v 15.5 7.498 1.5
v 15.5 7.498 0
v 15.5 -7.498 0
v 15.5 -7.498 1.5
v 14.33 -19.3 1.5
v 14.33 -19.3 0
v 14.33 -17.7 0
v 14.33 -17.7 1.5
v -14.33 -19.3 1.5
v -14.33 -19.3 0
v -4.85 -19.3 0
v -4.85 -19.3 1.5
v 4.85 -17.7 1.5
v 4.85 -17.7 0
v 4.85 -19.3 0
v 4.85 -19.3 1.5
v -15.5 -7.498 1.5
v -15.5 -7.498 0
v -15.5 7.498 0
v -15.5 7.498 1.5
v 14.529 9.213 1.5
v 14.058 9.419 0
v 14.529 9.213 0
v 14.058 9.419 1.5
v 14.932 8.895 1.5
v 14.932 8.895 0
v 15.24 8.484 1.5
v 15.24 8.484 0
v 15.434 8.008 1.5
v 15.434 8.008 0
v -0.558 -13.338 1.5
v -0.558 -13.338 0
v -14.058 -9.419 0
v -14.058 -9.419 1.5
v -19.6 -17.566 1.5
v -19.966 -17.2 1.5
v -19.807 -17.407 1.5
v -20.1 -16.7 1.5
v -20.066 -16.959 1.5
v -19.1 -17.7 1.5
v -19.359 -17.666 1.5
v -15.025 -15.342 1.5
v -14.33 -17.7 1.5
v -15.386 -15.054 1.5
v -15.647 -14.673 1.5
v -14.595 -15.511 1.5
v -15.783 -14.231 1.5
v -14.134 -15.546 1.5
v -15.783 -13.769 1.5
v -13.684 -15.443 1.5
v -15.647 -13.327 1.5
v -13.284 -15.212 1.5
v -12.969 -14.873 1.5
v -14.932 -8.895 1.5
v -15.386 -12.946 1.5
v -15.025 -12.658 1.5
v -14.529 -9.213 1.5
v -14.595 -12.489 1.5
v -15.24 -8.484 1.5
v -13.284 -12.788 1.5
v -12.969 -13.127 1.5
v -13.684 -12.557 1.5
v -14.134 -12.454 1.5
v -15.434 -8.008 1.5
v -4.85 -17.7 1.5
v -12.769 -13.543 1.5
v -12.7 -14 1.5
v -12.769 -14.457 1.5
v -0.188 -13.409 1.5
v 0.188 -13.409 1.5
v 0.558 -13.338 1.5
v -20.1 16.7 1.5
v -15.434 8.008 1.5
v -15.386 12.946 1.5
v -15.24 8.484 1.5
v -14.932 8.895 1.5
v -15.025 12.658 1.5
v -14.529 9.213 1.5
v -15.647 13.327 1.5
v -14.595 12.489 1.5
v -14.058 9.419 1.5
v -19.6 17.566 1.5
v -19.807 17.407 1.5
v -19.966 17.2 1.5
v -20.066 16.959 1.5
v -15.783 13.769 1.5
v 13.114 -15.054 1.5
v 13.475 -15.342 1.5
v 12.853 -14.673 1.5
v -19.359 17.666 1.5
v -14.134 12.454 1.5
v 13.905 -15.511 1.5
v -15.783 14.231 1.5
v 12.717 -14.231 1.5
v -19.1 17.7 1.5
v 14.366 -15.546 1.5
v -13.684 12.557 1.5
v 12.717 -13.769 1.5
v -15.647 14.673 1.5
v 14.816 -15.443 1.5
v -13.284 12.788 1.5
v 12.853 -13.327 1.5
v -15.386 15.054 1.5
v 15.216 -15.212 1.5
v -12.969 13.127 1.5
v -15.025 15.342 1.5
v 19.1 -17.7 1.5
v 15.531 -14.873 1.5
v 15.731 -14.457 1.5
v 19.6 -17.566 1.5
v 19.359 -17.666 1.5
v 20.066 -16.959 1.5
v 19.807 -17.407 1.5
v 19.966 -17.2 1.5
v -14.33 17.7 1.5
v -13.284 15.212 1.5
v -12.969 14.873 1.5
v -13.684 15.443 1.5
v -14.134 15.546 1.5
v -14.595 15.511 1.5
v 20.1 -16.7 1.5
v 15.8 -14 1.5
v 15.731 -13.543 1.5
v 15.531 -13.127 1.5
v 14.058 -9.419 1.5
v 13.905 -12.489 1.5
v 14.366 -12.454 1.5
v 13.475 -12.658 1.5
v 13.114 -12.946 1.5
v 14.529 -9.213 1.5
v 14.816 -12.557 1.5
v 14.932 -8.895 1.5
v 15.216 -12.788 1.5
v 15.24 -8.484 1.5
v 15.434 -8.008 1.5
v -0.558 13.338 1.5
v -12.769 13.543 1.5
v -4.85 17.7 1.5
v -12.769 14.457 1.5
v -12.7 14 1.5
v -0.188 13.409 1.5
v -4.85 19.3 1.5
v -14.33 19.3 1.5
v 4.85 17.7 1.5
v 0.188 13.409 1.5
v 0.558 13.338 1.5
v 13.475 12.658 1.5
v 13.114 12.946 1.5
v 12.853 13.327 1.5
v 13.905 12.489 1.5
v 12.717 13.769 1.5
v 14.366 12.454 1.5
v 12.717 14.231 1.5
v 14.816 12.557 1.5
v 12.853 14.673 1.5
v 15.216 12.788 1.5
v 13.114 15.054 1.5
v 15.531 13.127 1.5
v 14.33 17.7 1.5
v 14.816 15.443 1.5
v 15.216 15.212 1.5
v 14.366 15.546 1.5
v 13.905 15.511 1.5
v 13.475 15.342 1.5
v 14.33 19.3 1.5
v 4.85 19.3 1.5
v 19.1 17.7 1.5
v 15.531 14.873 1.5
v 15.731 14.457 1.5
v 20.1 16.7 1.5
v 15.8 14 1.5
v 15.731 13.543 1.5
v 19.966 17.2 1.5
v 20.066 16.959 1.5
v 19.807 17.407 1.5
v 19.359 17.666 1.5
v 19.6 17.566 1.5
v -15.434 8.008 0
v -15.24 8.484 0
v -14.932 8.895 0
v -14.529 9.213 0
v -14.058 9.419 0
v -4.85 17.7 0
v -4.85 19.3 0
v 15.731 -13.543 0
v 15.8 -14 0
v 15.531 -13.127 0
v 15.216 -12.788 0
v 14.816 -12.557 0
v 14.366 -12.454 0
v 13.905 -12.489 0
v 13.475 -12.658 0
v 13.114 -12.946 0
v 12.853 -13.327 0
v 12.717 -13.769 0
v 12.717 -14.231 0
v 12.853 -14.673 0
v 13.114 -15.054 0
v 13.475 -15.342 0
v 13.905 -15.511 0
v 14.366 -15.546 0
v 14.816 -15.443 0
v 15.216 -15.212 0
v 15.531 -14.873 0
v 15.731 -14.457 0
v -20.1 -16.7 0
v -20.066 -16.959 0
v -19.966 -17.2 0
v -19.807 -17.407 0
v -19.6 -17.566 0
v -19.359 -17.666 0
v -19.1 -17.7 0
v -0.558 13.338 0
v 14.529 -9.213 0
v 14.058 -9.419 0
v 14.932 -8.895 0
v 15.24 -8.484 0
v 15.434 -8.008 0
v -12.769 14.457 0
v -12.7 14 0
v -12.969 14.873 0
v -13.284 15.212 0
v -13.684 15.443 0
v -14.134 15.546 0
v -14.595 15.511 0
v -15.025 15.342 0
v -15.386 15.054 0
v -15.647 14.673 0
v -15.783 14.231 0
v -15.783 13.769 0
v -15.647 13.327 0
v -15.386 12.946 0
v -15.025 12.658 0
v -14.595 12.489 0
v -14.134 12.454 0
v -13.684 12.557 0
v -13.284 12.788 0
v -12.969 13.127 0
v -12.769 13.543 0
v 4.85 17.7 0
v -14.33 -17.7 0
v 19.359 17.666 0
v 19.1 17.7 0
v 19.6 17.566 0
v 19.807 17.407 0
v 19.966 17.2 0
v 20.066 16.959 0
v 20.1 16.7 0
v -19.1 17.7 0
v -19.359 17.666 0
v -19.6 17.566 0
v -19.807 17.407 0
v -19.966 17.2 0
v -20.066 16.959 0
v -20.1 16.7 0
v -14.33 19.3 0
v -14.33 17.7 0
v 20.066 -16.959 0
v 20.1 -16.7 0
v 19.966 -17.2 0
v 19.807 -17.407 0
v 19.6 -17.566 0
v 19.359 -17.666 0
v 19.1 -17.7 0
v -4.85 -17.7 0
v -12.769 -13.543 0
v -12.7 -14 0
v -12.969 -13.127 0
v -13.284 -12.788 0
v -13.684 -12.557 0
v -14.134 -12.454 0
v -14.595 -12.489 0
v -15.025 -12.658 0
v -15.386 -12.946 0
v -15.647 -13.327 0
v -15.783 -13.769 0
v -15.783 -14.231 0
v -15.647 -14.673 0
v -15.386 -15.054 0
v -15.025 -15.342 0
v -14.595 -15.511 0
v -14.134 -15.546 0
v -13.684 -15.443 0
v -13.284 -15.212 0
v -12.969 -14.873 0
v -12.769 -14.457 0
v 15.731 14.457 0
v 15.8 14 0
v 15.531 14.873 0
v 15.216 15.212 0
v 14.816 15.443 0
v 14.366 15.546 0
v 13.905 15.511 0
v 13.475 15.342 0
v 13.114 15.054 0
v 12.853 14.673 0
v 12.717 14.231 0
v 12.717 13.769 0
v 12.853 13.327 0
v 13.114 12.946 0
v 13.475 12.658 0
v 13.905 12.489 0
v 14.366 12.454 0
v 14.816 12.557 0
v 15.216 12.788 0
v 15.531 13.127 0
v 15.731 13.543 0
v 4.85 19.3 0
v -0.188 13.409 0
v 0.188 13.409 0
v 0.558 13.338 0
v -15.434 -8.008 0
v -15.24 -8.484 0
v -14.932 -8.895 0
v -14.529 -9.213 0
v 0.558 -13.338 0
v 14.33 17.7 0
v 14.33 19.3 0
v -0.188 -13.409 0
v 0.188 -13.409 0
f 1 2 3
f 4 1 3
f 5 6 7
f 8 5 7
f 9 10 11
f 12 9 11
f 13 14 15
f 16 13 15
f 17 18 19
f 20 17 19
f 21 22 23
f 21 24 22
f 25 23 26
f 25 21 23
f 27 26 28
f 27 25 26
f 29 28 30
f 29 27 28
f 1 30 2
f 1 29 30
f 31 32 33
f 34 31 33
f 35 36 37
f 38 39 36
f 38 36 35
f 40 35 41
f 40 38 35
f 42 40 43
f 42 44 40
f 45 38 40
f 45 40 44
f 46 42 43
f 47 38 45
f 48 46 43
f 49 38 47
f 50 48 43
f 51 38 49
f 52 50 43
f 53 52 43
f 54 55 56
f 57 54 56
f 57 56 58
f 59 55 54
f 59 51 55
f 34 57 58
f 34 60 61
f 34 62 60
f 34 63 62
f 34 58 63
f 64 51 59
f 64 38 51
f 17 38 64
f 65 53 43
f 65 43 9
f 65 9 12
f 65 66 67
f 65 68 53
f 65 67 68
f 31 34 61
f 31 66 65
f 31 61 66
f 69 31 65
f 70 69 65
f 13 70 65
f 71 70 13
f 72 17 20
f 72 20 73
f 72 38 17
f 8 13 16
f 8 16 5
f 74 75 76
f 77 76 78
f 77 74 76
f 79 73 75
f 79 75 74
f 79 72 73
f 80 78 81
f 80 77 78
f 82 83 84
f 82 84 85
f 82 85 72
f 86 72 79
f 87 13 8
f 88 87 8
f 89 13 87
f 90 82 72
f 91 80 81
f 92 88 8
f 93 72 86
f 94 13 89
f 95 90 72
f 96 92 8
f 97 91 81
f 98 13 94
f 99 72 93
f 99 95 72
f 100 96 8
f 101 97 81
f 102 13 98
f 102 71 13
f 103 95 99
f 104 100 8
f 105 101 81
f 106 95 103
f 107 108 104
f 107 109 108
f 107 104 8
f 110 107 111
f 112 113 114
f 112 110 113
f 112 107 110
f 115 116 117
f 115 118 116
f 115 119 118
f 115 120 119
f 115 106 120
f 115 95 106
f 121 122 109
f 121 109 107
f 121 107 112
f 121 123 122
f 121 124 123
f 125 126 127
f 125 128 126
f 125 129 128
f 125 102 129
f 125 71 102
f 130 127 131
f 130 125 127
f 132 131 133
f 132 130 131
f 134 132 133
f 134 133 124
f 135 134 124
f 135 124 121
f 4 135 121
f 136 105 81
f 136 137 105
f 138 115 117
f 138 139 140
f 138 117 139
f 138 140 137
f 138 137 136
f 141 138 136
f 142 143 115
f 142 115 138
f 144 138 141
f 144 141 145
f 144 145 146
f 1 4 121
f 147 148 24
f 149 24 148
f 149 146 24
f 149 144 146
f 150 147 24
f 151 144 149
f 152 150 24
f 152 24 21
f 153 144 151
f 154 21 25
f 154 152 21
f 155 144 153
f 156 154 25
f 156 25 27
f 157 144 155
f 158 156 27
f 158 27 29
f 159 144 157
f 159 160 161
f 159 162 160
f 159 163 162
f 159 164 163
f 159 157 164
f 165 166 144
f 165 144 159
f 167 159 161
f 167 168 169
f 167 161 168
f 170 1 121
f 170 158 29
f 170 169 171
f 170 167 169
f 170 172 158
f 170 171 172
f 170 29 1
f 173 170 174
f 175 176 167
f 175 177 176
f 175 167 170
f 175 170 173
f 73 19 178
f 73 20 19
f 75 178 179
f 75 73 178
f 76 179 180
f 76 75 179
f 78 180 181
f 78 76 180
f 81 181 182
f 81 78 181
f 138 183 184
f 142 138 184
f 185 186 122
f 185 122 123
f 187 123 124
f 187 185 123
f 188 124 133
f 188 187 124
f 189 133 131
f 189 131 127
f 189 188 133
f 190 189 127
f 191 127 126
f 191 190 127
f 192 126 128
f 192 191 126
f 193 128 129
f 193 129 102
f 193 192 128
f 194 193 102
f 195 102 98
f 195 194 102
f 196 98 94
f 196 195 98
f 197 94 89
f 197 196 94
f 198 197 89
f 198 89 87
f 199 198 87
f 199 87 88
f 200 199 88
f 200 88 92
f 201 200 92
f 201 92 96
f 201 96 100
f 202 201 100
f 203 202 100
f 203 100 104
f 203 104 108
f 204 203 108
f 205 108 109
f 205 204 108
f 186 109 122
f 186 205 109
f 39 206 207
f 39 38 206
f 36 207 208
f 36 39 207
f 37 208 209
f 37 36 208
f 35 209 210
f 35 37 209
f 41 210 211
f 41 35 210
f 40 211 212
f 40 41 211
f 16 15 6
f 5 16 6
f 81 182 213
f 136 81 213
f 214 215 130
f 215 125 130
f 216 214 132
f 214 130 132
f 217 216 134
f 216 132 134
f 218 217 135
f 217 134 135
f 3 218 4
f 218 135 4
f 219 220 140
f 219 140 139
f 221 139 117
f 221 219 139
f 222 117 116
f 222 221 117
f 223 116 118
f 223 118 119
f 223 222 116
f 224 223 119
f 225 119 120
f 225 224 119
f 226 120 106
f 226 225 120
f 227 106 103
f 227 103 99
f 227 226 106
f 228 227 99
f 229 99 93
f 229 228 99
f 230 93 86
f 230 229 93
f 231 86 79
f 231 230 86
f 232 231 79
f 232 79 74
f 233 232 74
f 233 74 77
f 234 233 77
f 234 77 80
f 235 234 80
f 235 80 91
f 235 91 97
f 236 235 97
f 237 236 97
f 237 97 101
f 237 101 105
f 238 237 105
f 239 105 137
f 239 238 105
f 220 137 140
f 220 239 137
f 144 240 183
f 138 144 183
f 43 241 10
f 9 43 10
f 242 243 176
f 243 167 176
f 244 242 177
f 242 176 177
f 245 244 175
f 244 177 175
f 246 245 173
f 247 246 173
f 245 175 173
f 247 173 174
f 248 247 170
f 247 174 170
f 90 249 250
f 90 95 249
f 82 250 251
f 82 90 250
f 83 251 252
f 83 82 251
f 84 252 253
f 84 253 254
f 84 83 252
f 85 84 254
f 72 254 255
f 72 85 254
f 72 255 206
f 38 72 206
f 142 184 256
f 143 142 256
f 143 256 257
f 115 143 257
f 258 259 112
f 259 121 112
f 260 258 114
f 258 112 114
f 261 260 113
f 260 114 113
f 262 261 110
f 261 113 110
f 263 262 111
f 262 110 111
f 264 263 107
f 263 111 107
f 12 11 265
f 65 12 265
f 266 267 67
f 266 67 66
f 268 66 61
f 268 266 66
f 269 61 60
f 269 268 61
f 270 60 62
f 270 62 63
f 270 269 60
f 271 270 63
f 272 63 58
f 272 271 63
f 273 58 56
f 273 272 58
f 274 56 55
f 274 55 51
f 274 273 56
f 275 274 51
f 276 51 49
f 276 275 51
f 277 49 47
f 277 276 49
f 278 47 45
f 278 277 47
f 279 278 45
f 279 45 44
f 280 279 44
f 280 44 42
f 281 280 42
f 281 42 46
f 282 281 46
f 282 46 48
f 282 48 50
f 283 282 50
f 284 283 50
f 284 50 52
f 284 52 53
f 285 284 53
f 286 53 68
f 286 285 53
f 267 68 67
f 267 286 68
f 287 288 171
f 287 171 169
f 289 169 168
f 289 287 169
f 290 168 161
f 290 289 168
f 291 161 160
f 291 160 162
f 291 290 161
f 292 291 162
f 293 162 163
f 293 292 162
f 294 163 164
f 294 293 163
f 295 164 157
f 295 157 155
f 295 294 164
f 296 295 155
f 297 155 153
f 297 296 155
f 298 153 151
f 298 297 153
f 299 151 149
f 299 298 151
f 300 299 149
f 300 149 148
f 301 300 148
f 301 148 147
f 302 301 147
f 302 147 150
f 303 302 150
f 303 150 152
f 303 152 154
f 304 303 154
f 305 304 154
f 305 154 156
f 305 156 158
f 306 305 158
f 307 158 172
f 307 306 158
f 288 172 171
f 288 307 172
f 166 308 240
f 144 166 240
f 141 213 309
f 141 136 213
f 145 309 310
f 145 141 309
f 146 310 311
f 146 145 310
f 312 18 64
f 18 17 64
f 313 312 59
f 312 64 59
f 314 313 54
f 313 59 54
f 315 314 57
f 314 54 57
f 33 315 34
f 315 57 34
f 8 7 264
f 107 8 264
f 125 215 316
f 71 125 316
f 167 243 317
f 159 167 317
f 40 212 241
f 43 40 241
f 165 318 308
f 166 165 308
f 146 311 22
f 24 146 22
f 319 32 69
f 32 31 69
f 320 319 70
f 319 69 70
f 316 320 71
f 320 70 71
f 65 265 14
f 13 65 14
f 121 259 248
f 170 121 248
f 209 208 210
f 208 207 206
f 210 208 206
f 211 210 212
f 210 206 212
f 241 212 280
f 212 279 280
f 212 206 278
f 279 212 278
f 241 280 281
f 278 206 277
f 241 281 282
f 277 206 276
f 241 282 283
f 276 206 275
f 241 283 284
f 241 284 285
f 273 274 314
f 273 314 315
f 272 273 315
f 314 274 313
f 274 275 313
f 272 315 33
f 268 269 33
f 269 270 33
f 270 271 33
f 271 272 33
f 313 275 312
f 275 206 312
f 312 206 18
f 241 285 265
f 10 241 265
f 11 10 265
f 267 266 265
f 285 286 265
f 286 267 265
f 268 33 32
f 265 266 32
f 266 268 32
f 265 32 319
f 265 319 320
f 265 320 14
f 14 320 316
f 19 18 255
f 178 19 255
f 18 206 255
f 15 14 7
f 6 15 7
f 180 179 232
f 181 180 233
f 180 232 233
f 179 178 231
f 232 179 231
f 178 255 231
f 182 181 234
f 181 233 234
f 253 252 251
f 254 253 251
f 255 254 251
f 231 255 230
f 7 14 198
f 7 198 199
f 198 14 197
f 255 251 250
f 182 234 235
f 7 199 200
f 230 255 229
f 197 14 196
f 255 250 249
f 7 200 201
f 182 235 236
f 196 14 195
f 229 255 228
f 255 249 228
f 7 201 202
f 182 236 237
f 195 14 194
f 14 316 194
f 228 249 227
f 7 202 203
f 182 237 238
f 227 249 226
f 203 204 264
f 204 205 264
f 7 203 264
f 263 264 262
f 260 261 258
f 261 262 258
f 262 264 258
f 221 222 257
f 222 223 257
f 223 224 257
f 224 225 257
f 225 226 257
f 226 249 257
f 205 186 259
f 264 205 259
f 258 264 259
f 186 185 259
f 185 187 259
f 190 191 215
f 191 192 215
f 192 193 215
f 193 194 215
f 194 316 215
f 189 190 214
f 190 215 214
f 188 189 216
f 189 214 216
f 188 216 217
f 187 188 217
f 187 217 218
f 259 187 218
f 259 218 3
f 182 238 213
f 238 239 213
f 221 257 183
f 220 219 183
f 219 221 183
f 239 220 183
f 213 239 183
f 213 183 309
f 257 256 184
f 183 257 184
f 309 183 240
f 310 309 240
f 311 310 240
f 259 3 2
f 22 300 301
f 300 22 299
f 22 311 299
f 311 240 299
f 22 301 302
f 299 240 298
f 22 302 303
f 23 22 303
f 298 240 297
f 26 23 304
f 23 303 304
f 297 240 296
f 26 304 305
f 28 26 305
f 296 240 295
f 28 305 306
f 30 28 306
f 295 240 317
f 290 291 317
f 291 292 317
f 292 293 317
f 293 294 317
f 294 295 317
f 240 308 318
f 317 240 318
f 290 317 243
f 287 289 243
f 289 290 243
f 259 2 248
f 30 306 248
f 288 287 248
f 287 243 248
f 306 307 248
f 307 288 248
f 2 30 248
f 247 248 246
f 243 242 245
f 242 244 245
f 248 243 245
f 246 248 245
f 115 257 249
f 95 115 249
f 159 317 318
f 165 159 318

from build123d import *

# Parameters (mm, degrees)
F0_R     = 1.55
F1_DEPTH = 1.5
F2_R     = 2
F3_R     = 1


with BuildPart() as f1:
    # F0 (on Top) → F1 (new body)
    with BuildSketch(Plane.XY):
        Polygon((-14.33, 17.7), (-20.1, 17.7), (-20.1, -17.7), (-14.33, -17.7), (-14.33, -19.3), (-4.85, -19.3), (-4.85, -17.7), (0, -17.7), (4.85, -17.7), (4.85, -19.3), (14.33, -19.3), (14.33, -17.7), (20.1, -17.7), (20.1, 17.7), (14.33, 17.7), (14.33, 19.3), (4.85, 19.3), (4.85, 17.7), (0, 17.7), (-4.85, 17.7), (-4.85, 19.3), (-14.33, 19.3), align=None)
        with Locations((-14.25, -14)):
            Circle(F0_R, mode=Mode.SUBTRACT)
        with Locations((14.25, -14)):
            Circle(F0_R, mode=Mode.SUBTRACT)
        with Locations((-14.25, 14)):
            Circle(F0_R, mode=Mode.SUBTRACT)
        Polygon((-15.5, 9), (0, 13.5), (15.5, 9), (15.5, -9), (0, -13.5), (-15.5, -9), align=None, mode=Mode.SUBTRACT)
        with Locations((14.25, 14)):
            Circle(F0_R, mode=Mode.SUBTRACT)
    extrude(amount=F1_DEPTH)

    # F2
    f2_edges = [f1.edges().sort_by_distance(p)[0] for p in [
        (-15.5, -9, 0.75),
        (-15.5, 9, 0.75),
        (0, 13.5, 0.75),
        (15.5, 9, 0.75),
        (15.5, -9, 0.75),
        (0, -13.5, 0.75),
    ]]
    fillet(f2_edges, radius=F2_R)

    # F3
    f3_edges = [f1.edges().sort_by_distance(p)[0] for p in [
        (-20.1, 17.7, 0.75),
        (20.1, 17.7, 0.75),
        (20.1, -17.7, 0.75),
        (-20.1, -17.7, 0.75),
    ]]
    fillet(f3_edges, radius=F3_R)


solid = f1.part
